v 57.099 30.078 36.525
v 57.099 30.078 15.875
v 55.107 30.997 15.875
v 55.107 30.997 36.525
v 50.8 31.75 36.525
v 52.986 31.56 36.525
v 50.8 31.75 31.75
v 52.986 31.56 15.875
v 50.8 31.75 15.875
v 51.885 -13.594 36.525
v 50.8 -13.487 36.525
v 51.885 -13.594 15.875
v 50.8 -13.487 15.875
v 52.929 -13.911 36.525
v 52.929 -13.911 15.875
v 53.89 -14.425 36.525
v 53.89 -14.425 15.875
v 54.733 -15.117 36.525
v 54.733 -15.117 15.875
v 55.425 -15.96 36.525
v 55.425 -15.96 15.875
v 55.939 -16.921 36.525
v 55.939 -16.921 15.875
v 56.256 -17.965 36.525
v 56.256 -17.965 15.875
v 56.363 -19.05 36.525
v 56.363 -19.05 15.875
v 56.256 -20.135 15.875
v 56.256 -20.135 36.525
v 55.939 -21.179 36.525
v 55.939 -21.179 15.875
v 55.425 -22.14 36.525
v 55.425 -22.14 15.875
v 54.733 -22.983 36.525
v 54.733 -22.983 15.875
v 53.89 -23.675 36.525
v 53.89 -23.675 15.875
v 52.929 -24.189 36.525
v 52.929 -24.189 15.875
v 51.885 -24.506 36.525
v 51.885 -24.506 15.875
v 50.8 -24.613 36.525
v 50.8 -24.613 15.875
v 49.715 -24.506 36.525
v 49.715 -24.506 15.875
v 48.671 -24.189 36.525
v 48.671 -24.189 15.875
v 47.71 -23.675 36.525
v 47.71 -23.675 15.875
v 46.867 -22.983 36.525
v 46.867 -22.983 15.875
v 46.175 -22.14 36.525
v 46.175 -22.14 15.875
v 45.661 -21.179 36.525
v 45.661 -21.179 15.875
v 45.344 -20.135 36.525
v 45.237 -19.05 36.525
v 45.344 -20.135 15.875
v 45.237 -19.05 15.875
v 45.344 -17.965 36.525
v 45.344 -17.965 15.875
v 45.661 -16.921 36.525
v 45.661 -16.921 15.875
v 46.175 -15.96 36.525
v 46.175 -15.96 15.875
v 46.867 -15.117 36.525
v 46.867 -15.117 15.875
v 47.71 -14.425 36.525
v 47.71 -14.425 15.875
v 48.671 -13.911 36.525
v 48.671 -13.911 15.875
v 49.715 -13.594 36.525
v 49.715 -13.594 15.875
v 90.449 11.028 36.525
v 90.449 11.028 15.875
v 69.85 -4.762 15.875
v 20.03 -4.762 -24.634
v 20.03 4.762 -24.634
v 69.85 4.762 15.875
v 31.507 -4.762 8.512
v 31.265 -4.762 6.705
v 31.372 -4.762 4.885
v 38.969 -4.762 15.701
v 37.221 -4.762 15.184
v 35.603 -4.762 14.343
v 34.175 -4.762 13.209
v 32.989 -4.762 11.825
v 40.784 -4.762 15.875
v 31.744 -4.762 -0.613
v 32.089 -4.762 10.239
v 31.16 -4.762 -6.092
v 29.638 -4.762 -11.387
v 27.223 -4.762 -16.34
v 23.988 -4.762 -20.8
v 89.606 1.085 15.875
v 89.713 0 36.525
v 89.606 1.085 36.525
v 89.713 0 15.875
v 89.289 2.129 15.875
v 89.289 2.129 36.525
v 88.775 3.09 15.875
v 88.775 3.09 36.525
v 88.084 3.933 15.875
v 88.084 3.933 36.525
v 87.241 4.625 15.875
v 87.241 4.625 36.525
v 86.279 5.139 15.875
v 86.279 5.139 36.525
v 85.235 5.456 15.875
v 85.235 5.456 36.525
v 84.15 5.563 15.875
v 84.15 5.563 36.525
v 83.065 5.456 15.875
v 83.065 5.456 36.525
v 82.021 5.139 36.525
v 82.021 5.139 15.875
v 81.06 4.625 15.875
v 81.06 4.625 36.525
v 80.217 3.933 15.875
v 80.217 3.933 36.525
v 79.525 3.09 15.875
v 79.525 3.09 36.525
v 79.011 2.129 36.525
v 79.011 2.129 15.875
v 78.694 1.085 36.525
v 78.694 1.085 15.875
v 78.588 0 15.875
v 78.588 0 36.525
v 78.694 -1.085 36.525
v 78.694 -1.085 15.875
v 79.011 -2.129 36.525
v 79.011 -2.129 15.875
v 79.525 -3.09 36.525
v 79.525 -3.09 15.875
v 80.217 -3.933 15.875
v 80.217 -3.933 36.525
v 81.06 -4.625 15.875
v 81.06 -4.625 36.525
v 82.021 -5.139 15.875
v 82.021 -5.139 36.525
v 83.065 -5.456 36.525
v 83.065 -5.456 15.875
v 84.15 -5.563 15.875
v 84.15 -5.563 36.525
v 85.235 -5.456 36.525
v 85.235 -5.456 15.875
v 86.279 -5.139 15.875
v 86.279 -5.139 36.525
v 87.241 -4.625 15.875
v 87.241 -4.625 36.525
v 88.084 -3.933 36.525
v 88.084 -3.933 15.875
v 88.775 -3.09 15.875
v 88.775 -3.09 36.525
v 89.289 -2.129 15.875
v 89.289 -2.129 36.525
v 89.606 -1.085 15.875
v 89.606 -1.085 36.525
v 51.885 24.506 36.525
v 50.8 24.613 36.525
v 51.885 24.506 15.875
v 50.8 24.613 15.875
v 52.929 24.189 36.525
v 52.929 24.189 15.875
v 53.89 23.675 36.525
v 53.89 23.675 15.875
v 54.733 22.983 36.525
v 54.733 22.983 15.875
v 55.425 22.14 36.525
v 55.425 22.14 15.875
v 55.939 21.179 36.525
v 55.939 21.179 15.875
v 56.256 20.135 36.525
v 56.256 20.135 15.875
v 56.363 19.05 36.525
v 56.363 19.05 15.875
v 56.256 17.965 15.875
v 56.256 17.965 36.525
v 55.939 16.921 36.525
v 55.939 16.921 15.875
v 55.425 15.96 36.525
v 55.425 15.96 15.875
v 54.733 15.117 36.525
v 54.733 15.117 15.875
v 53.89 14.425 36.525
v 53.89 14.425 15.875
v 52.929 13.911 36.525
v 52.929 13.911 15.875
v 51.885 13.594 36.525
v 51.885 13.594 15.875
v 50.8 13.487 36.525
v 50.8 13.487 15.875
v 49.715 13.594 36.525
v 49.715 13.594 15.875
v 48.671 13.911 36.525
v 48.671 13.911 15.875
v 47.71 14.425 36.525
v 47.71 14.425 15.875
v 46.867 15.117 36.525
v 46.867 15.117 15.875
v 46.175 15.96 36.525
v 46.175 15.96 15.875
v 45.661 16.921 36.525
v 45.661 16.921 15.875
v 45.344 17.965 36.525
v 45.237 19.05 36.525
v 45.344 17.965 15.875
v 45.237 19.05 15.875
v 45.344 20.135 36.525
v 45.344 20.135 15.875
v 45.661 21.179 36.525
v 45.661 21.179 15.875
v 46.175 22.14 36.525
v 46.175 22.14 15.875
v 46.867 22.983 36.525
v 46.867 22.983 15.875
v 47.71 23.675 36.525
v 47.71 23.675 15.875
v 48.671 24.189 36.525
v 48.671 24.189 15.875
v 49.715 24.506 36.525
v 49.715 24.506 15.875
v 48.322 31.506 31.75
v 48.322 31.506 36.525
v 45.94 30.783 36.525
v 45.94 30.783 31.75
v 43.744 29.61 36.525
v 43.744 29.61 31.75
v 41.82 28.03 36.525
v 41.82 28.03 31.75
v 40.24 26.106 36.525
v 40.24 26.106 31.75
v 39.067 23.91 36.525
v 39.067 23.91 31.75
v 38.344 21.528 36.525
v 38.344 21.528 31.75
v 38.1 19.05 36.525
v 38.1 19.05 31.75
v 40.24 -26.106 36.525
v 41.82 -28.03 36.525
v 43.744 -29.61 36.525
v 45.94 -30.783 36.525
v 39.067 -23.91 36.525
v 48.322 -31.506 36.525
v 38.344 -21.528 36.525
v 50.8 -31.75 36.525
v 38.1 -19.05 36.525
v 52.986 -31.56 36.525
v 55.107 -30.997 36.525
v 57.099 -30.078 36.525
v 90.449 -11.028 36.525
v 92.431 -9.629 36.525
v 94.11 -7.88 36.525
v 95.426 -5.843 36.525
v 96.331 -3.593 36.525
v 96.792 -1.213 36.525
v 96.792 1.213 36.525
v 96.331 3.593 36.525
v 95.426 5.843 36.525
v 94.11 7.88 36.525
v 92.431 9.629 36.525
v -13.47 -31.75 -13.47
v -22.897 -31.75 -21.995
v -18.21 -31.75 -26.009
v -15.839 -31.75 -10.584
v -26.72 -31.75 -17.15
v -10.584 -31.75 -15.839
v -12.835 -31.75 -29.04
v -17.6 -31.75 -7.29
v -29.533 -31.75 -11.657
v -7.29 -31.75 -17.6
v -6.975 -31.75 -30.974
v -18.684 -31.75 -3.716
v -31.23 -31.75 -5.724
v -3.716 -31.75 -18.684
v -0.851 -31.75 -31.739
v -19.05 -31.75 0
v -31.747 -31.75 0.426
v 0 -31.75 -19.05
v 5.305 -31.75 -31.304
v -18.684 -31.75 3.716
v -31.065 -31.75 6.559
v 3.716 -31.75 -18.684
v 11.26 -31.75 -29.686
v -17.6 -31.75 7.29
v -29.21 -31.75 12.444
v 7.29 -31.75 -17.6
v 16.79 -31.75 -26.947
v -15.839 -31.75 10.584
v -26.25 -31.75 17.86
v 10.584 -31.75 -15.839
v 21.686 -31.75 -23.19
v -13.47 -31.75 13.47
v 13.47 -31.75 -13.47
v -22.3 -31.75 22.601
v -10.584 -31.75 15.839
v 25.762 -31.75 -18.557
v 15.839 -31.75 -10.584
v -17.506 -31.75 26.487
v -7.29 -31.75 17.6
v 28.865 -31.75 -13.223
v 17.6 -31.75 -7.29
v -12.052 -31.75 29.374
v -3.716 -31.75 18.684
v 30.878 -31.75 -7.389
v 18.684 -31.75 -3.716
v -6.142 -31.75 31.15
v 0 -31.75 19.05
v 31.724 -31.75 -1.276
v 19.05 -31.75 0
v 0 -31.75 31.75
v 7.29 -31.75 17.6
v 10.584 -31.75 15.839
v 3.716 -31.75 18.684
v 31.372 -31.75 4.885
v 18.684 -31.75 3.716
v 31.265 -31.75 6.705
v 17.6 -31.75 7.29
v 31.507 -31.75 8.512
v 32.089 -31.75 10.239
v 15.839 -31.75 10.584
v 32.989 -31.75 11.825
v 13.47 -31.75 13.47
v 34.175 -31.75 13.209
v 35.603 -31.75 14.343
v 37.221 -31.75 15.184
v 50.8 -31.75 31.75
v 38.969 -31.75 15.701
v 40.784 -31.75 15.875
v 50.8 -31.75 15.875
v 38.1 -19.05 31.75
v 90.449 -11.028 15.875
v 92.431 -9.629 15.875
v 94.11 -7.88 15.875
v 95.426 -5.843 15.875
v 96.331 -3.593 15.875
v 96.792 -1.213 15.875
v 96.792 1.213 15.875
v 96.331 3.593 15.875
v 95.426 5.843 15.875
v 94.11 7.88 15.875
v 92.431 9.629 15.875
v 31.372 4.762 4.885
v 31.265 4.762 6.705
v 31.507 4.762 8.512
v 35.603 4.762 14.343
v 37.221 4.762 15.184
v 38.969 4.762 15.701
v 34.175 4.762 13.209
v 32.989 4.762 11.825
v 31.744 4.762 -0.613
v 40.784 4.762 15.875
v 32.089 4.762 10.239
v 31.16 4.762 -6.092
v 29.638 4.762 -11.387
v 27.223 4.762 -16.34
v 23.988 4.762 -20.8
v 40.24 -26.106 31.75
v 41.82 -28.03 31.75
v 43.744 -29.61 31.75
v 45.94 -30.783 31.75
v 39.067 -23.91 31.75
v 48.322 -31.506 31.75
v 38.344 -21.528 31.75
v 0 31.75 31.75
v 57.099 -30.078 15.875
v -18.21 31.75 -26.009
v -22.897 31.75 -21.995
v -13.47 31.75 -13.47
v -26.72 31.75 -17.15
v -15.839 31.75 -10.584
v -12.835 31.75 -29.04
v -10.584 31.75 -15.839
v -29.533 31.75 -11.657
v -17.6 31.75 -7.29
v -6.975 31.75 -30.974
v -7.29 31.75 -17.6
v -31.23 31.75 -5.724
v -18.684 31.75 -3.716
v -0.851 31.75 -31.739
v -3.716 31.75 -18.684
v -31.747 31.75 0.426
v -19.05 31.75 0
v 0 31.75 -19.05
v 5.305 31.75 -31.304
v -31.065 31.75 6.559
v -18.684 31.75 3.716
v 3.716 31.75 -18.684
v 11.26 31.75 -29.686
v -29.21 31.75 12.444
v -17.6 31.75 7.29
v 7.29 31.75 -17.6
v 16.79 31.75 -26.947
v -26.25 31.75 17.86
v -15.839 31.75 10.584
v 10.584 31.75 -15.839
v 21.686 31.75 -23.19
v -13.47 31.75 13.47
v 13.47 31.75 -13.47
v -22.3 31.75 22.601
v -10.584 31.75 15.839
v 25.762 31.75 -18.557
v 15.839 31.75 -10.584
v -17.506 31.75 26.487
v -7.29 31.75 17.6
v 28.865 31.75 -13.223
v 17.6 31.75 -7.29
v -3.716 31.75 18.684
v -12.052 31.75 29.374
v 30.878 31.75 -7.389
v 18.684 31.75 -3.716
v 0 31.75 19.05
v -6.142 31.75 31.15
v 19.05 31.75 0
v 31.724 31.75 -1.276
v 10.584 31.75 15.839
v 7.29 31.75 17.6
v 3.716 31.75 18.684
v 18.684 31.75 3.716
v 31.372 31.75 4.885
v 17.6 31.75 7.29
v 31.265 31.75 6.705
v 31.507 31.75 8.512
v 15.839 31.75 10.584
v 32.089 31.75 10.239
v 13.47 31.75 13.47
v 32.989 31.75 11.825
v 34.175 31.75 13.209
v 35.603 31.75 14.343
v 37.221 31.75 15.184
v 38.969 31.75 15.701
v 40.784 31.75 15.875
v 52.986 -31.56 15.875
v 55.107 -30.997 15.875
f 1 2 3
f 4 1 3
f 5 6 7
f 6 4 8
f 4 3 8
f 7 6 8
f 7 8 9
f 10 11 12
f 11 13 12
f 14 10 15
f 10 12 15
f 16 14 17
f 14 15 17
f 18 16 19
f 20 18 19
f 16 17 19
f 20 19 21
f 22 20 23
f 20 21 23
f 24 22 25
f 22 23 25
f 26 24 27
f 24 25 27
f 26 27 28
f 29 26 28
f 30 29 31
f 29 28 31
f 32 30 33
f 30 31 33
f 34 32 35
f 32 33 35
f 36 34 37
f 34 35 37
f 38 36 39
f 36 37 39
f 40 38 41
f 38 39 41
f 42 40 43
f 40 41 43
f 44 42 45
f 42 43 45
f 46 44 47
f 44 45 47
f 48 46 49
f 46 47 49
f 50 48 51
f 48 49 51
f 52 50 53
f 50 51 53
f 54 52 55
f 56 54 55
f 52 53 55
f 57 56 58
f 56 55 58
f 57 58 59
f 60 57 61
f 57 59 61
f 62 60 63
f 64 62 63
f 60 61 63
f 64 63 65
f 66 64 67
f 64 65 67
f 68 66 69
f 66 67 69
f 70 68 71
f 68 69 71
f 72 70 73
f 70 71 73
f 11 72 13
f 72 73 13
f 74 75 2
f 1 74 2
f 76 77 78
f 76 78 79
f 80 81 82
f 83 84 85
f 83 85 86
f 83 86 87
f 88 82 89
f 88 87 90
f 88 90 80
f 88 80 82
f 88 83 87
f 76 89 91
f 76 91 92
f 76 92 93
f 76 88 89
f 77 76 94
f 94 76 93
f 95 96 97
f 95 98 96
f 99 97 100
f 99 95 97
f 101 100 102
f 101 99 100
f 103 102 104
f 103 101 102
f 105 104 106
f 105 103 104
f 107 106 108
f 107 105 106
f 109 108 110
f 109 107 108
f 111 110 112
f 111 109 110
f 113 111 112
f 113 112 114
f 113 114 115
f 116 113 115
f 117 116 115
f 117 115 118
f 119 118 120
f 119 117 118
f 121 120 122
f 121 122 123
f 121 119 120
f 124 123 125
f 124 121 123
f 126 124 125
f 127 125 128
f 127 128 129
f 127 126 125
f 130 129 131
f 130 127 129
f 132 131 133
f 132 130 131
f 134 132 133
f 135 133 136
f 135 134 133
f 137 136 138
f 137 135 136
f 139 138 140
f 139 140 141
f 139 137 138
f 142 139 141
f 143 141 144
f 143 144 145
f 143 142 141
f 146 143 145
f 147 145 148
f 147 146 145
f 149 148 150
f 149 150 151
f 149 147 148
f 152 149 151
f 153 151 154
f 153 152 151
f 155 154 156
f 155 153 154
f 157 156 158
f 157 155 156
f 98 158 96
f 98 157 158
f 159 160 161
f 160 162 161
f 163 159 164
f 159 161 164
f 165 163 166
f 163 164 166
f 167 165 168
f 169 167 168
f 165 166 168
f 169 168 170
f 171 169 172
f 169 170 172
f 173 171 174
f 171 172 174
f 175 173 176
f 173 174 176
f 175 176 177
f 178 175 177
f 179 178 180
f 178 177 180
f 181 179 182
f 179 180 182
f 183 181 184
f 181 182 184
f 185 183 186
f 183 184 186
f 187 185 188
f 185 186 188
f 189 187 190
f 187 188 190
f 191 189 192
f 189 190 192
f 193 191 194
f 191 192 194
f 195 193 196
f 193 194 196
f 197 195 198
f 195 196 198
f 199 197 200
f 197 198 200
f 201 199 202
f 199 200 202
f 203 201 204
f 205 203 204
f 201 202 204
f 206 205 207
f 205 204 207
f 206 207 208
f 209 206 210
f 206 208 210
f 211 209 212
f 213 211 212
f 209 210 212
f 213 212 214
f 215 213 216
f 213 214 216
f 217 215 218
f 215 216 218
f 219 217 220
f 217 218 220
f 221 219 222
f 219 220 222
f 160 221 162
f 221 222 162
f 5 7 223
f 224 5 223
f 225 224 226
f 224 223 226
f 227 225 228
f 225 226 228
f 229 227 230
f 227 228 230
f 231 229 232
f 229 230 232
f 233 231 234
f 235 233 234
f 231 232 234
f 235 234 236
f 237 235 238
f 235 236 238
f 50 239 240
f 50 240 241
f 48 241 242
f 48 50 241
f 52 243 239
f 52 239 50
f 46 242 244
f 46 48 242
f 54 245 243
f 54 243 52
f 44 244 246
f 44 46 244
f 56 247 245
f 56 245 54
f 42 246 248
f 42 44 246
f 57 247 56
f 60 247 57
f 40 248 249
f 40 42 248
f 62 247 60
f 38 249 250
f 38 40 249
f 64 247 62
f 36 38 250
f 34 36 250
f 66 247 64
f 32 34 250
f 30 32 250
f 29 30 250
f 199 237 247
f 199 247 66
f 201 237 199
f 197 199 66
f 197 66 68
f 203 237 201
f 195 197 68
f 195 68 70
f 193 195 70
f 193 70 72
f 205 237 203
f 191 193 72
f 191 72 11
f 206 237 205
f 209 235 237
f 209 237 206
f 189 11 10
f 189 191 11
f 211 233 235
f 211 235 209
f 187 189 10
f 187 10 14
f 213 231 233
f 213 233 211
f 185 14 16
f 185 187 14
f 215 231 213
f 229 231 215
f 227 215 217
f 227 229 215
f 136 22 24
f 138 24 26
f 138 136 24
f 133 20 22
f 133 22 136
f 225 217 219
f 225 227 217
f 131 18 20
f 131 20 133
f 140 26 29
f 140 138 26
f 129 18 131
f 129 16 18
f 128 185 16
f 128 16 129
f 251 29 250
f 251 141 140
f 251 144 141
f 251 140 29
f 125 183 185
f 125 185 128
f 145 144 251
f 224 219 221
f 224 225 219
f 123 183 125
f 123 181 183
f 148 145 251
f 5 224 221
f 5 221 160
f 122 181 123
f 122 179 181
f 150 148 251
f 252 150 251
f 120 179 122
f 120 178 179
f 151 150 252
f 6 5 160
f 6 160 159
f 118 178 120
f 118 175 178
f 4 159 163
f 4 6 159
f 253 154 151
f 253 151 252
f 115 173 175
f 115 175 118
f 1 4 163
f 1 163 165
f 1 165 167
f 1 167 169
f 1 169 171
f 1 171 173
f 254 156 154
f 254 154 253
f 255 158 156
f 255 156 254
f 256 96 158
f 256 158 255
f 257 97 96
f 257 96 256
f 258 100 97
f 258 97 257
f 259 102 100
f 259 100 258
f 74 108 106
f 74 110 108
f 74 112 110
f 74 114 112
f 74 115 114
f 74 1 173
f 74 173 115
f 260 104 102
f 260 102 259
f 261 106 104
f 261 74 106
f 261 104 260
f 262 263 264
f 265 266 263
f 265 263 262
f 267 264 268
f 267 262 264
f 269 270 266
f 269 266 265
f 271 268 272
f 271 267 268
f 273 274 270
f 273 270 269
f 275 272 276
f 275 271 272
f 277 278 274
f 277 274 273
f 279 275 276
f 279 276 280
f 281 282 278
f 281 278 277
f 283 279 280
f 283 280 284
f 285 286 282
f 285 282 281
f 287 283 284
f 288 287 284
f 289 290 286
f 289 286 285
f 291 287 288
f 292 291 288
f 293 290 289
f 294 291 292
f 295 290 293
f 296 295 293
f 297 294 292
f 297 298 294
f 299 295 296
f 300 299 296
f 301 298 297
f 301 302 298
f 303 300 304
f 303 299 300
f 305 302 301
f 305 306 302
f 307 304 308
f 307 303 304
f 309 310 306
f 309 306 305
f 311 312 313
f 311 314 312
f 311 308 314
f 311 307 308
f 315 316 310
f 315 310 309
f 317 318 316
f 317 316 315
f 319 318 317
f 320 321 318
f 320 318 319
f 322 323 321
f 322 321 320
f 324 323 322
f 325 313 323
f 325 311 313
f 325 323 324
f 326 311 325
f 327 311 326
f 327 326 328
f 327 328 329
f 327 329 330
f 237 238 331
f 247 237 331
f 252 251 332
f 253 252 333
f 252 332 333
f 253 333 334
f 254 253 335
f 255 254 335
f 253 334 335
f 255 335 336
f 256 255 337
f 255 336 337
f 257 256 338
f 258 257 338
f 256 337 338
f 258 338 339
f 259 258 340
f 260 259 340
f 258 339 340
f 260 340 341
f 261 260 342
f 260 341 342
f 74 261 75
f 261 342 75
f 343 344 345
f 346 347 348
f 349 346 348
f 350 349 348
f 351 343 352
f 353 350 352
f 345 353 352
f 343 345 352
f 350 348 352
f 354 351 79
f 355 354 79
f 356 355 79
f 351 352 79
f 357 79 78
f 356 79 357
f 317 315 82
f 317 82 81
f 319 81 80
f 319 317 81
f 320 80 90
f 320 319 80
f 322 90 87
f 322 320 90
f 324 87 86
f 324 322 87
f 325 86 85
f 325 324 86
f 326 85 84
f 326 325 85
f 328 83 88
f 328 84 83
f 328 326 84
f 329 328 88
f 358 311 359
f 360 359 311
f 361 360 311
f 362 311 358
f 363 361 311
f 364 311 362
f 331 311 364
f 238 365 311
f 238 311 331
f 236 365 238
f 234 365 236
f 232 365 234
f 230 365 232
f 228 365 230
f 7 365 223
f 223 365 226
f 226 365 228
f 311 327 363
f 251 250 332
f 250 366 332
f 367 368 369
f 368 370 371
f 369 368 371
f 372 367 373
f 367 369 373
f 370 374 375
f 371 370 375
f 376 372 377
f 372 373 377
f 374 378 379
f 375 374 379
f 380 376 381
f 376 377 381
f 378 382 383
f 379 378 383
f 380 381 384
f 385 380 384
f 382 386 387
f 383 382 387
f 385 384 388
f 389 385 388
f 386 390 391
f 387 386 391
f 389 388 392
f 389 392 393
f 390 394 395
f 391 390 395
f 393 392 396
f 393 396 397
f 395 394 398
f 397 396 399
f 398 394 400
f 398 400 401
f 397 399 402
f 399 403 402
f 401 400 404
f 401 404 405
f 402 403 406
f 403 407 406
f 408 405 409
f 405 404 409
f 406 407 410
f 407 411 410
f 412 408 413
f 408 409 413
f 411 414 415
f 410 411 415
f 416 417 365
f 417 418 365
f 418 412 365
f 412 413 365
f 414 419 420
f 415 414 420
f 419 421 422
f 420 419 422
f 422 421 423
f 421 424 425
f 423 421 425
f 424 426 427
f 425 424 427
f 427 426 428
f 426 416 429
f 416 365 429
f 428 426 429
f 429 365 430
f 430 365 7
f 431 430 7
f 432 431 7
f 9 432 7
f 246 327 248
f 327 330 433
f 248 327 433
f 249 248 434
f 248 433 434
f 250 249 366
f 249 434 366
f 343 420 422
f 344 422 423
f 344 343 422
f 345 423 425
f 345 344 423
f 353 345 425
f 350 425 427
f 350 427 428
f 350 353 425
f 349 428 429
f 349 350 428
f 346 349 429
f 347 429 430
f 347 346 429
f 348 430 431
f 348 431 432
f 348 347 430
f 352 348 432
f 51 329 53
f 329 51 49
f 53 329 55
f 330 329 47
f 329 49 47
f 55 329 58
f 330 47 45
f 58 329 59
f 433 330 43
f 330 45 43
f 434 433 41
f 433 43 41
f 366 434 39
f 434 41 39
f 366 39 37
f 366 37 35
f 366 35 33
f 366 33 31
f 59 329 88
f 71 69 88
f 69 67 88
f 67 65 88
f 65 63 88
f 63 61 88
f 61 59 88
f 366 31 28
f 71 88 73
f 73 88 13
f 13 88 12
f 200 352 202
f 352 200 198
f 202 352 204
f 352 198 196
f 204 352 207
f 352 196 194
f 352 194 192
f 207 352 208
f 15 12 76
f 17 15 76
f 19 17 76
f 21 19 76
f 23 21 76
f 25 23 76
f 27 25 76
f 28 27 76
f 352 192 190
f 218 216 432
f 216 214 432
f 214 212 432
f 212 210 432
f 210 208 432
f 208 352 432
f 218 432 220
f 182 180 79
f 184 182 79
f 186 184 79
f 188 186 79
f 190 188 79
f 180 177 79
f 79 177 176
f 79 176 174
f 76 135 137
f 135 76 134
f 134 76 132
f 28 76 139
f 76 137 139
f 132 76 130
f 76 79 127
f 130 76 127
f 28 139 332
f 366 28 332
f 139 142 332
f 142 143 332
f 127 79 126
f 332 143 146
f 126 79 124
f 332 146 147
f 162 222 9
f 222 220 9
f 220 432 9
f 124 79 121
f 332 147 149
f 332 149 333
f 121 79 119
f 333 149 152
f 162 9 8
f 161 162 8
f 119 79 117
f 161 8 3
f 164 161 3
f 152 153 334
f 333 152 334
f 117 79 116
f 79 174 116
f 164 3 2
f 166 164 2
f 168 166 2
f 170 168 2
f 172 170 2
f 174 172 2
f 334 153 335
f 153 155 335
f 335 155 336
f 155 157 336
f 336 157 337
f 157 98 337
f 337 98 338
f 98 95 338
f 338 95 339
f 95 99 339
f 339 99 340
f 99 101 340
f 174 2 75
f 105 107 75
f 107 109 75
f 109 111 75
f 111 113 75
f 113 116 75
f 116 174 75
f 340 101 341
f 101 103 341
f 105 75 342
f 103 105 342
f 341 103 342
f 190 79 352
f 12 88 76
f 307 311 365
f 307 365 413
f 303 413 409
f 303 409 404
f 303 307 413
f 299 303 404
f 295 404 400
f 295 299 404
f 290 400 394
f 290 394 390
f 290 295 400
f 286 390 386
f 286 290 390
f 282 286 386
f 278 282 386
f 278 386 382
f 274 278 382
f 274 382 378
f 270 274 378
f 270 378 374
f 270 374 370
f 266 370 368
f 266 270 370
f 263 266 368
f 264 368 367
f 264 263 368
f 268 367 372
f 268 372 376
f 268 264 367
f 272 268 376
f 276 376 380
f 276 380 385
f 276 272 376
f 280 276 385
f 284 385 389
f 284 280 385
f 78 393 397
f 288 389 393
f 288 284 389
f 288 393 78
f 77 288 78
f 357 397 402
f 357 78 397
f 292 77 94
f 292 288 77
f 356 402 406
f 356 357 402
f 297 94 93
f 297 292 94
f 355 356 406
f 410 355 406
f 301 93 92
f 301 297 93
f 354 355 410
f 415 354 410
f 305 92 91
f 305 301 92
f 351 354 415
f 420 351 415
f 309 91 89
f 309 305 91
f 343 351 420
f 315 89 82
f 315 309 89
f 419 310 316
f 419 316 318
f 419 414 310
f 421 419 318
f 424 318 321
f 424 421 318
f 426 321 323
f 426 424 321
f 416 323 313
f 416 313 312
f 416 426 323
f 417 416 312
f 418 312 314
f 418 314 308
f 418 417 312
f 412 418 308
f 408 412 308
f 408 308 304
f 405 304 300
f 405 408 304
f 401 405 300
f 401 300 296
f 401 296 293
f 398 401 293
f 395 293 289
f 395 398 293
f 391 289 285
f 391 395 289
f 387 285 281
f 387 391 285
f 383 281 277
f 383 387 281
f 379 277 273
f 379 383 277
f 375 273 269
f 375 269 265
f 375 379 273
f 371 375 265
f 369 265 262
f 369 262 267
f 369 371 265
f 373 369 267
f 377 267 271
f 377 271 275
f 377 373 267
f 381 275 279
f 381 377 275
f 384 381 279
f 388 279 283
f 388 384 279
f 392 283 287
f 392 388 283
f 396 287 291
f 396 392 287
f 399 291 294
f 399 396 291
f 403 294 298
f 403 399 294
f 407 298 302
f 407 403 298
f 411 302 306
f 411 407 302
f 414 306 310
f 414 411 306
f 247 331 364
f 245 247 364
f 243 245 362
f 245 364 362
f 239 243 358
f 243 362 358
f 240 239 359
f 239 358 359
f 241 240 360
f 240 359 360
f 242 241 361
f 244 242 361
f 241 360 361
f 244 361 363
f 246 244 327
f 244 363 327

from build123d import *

# Parameters (mm, degrees)
F0_R          = 19.05
F1_DEPTH      = 31.75
F2_DEPTH      = 4.7625
F3_R          = 5.5626
F4_DEPTH      = 15.875
F4_DEPTH_BACK = 4.7752
F5_DEPTH      = 63.501


with BuildPart() as f1:
    # F0 (on Front) → F1 (new body, symmetric)
    with BuildSketch(Plane.XZ):
        with BuildLine():
            Line((50.8, 31.75), (0, 31.75))
            ThreePointArc((0, 31.75), (-29.9181979044, -10.6284492827), (20.0304912791, -24.6341616281))
            ThreePointArc((20.0304912791, -24.6341616281), (29.6377097996, -11.3872146654), (31.3720103364, 4.8846153846))
            ThreePointArc((31.3720103364, 4.8846153846), (33.5488565837, 12.545475629), (40.7836134373, 15.875))
            Line((40.7836134373, 15.875), (50.8, 15.875))
            Line((50.8, 15.875), (50.8, 31.75))
        make_face()
        Circle(F0_R, mode=Mode.SUBTRACT)
    extrude(amount=F1_DEPTH, both=True)

    # F0 (on Front) → F2 (join, symmetric)
    with BuildSketch(Plane.XZ):
        with BuildLine():
            ThreePointArc((31.3720103364, 4.8846153846), (29.6377097996, -11.3872146654), (20.0304912791, -24.6341616281))
            Line((20.0304912791, -24.6341616281), (69.85, 15.875))
            Line((69.85, 15.875), (50.8, 15.875))
            Line((50.8, 15.875), (40.7836134373, 15.875))
            ThreePointArc((40.7836134373, 15.875), (33.5488565837, 12.545475629), (31.3720103364, 4.8846153846))
        make_face()
    extrude(amount=F2_DEPTH, both=True)

    # F3 (on face) → F4 (join, two sides)
    with BuildSketch(Plane.XY.offset(31.75)) as f4_sk:
        with BuildLine():
            ThreePointArc((57.0991554441, 30.0777214642), (54.0586759125, 31.3248128824), (50.8, 31.75))
            Line((50.8, 31.75), (50.8, 24.6126))
            ThreePointArc((50.8, 24.6126), (54.733352181, 22.983352181), (56.3626, 19.05))
            ThreePointArc((56.3626, 19.05), (54.733352181, 15.116647819), (50.8, 13.4874))
            Line((50.8, 13.4874), (50.8, -13.4874))
            ThreePointArc((50.8, -13.4874), (54.733352181, -15.116647819), (56.3626, -19.05))
            ThreePointArc((56.3626, -19.05), (54.733352181, -22.983352181), (50.8, -24.6126))
            Line((50.8, -24.6126), (50.8, -31.75))
            ThreePointArc((50.8, -31.75), (54.0586759125, -31.3248128824), (57.0991554441, -30.0777214642))
            Line((57.0991554441, -30.0777214642), (90.4493554441, -11.0277214642))
            ThreePointArc((90.4493554441, -11.0277214642), (96.8502, 0), (90.4493554441, 11.0277214642))
            Line((90.4493554441, 11.0277214642), (57.0991554441, 30.0777214642))
        make_face()
        with Locations((84.1502, 0)):
            Circle(F3_R, mode=Mode.SUBTRACT)
        with BuildLine():
            Line((50.8, 24.6126), (50.8, 31.75))
            ThreePointArc((50.8, 31.75), (41.8197438789, 28.0302561211), (38.1, 19.05))
            Line((38.1, 19.05), (38.1, -19.05))
            ThreePointArc((38.1, -19.05), (41.8197438789, -28.0302561211), (50.8, -31.75))
            Line((50.8, -31.75), (50.8, -24.6126))
            ThreePointArc((50.8, -24.6126), (45.2374, -19.05), (50.8, -13.4874))
            Line((50.8, -13.4874), (50.8, 13.4874))
            ThreePointArc((50.8, 13.4874), (45.2374, 19.05), (50.8, 24.6126))
        make_face()
    extrude(amount=-F4_DEPTH)
    extrude(f4_sk.sketch, amount=F4_DEPTH_BACK)

    # F5 (cut, through all): faces of the model
    f5_faces = [f1.faces().sort_by_distance(p)[0] for p in [
        (48.4391592362, -19.05, 31.75),
        (48.4391592362, 19.05, 31.75),
    ]]
    extrude(f5_faces, amount=-F5_DEPTH, mode=Mode.SUBTRACT)


solid = f1.part
